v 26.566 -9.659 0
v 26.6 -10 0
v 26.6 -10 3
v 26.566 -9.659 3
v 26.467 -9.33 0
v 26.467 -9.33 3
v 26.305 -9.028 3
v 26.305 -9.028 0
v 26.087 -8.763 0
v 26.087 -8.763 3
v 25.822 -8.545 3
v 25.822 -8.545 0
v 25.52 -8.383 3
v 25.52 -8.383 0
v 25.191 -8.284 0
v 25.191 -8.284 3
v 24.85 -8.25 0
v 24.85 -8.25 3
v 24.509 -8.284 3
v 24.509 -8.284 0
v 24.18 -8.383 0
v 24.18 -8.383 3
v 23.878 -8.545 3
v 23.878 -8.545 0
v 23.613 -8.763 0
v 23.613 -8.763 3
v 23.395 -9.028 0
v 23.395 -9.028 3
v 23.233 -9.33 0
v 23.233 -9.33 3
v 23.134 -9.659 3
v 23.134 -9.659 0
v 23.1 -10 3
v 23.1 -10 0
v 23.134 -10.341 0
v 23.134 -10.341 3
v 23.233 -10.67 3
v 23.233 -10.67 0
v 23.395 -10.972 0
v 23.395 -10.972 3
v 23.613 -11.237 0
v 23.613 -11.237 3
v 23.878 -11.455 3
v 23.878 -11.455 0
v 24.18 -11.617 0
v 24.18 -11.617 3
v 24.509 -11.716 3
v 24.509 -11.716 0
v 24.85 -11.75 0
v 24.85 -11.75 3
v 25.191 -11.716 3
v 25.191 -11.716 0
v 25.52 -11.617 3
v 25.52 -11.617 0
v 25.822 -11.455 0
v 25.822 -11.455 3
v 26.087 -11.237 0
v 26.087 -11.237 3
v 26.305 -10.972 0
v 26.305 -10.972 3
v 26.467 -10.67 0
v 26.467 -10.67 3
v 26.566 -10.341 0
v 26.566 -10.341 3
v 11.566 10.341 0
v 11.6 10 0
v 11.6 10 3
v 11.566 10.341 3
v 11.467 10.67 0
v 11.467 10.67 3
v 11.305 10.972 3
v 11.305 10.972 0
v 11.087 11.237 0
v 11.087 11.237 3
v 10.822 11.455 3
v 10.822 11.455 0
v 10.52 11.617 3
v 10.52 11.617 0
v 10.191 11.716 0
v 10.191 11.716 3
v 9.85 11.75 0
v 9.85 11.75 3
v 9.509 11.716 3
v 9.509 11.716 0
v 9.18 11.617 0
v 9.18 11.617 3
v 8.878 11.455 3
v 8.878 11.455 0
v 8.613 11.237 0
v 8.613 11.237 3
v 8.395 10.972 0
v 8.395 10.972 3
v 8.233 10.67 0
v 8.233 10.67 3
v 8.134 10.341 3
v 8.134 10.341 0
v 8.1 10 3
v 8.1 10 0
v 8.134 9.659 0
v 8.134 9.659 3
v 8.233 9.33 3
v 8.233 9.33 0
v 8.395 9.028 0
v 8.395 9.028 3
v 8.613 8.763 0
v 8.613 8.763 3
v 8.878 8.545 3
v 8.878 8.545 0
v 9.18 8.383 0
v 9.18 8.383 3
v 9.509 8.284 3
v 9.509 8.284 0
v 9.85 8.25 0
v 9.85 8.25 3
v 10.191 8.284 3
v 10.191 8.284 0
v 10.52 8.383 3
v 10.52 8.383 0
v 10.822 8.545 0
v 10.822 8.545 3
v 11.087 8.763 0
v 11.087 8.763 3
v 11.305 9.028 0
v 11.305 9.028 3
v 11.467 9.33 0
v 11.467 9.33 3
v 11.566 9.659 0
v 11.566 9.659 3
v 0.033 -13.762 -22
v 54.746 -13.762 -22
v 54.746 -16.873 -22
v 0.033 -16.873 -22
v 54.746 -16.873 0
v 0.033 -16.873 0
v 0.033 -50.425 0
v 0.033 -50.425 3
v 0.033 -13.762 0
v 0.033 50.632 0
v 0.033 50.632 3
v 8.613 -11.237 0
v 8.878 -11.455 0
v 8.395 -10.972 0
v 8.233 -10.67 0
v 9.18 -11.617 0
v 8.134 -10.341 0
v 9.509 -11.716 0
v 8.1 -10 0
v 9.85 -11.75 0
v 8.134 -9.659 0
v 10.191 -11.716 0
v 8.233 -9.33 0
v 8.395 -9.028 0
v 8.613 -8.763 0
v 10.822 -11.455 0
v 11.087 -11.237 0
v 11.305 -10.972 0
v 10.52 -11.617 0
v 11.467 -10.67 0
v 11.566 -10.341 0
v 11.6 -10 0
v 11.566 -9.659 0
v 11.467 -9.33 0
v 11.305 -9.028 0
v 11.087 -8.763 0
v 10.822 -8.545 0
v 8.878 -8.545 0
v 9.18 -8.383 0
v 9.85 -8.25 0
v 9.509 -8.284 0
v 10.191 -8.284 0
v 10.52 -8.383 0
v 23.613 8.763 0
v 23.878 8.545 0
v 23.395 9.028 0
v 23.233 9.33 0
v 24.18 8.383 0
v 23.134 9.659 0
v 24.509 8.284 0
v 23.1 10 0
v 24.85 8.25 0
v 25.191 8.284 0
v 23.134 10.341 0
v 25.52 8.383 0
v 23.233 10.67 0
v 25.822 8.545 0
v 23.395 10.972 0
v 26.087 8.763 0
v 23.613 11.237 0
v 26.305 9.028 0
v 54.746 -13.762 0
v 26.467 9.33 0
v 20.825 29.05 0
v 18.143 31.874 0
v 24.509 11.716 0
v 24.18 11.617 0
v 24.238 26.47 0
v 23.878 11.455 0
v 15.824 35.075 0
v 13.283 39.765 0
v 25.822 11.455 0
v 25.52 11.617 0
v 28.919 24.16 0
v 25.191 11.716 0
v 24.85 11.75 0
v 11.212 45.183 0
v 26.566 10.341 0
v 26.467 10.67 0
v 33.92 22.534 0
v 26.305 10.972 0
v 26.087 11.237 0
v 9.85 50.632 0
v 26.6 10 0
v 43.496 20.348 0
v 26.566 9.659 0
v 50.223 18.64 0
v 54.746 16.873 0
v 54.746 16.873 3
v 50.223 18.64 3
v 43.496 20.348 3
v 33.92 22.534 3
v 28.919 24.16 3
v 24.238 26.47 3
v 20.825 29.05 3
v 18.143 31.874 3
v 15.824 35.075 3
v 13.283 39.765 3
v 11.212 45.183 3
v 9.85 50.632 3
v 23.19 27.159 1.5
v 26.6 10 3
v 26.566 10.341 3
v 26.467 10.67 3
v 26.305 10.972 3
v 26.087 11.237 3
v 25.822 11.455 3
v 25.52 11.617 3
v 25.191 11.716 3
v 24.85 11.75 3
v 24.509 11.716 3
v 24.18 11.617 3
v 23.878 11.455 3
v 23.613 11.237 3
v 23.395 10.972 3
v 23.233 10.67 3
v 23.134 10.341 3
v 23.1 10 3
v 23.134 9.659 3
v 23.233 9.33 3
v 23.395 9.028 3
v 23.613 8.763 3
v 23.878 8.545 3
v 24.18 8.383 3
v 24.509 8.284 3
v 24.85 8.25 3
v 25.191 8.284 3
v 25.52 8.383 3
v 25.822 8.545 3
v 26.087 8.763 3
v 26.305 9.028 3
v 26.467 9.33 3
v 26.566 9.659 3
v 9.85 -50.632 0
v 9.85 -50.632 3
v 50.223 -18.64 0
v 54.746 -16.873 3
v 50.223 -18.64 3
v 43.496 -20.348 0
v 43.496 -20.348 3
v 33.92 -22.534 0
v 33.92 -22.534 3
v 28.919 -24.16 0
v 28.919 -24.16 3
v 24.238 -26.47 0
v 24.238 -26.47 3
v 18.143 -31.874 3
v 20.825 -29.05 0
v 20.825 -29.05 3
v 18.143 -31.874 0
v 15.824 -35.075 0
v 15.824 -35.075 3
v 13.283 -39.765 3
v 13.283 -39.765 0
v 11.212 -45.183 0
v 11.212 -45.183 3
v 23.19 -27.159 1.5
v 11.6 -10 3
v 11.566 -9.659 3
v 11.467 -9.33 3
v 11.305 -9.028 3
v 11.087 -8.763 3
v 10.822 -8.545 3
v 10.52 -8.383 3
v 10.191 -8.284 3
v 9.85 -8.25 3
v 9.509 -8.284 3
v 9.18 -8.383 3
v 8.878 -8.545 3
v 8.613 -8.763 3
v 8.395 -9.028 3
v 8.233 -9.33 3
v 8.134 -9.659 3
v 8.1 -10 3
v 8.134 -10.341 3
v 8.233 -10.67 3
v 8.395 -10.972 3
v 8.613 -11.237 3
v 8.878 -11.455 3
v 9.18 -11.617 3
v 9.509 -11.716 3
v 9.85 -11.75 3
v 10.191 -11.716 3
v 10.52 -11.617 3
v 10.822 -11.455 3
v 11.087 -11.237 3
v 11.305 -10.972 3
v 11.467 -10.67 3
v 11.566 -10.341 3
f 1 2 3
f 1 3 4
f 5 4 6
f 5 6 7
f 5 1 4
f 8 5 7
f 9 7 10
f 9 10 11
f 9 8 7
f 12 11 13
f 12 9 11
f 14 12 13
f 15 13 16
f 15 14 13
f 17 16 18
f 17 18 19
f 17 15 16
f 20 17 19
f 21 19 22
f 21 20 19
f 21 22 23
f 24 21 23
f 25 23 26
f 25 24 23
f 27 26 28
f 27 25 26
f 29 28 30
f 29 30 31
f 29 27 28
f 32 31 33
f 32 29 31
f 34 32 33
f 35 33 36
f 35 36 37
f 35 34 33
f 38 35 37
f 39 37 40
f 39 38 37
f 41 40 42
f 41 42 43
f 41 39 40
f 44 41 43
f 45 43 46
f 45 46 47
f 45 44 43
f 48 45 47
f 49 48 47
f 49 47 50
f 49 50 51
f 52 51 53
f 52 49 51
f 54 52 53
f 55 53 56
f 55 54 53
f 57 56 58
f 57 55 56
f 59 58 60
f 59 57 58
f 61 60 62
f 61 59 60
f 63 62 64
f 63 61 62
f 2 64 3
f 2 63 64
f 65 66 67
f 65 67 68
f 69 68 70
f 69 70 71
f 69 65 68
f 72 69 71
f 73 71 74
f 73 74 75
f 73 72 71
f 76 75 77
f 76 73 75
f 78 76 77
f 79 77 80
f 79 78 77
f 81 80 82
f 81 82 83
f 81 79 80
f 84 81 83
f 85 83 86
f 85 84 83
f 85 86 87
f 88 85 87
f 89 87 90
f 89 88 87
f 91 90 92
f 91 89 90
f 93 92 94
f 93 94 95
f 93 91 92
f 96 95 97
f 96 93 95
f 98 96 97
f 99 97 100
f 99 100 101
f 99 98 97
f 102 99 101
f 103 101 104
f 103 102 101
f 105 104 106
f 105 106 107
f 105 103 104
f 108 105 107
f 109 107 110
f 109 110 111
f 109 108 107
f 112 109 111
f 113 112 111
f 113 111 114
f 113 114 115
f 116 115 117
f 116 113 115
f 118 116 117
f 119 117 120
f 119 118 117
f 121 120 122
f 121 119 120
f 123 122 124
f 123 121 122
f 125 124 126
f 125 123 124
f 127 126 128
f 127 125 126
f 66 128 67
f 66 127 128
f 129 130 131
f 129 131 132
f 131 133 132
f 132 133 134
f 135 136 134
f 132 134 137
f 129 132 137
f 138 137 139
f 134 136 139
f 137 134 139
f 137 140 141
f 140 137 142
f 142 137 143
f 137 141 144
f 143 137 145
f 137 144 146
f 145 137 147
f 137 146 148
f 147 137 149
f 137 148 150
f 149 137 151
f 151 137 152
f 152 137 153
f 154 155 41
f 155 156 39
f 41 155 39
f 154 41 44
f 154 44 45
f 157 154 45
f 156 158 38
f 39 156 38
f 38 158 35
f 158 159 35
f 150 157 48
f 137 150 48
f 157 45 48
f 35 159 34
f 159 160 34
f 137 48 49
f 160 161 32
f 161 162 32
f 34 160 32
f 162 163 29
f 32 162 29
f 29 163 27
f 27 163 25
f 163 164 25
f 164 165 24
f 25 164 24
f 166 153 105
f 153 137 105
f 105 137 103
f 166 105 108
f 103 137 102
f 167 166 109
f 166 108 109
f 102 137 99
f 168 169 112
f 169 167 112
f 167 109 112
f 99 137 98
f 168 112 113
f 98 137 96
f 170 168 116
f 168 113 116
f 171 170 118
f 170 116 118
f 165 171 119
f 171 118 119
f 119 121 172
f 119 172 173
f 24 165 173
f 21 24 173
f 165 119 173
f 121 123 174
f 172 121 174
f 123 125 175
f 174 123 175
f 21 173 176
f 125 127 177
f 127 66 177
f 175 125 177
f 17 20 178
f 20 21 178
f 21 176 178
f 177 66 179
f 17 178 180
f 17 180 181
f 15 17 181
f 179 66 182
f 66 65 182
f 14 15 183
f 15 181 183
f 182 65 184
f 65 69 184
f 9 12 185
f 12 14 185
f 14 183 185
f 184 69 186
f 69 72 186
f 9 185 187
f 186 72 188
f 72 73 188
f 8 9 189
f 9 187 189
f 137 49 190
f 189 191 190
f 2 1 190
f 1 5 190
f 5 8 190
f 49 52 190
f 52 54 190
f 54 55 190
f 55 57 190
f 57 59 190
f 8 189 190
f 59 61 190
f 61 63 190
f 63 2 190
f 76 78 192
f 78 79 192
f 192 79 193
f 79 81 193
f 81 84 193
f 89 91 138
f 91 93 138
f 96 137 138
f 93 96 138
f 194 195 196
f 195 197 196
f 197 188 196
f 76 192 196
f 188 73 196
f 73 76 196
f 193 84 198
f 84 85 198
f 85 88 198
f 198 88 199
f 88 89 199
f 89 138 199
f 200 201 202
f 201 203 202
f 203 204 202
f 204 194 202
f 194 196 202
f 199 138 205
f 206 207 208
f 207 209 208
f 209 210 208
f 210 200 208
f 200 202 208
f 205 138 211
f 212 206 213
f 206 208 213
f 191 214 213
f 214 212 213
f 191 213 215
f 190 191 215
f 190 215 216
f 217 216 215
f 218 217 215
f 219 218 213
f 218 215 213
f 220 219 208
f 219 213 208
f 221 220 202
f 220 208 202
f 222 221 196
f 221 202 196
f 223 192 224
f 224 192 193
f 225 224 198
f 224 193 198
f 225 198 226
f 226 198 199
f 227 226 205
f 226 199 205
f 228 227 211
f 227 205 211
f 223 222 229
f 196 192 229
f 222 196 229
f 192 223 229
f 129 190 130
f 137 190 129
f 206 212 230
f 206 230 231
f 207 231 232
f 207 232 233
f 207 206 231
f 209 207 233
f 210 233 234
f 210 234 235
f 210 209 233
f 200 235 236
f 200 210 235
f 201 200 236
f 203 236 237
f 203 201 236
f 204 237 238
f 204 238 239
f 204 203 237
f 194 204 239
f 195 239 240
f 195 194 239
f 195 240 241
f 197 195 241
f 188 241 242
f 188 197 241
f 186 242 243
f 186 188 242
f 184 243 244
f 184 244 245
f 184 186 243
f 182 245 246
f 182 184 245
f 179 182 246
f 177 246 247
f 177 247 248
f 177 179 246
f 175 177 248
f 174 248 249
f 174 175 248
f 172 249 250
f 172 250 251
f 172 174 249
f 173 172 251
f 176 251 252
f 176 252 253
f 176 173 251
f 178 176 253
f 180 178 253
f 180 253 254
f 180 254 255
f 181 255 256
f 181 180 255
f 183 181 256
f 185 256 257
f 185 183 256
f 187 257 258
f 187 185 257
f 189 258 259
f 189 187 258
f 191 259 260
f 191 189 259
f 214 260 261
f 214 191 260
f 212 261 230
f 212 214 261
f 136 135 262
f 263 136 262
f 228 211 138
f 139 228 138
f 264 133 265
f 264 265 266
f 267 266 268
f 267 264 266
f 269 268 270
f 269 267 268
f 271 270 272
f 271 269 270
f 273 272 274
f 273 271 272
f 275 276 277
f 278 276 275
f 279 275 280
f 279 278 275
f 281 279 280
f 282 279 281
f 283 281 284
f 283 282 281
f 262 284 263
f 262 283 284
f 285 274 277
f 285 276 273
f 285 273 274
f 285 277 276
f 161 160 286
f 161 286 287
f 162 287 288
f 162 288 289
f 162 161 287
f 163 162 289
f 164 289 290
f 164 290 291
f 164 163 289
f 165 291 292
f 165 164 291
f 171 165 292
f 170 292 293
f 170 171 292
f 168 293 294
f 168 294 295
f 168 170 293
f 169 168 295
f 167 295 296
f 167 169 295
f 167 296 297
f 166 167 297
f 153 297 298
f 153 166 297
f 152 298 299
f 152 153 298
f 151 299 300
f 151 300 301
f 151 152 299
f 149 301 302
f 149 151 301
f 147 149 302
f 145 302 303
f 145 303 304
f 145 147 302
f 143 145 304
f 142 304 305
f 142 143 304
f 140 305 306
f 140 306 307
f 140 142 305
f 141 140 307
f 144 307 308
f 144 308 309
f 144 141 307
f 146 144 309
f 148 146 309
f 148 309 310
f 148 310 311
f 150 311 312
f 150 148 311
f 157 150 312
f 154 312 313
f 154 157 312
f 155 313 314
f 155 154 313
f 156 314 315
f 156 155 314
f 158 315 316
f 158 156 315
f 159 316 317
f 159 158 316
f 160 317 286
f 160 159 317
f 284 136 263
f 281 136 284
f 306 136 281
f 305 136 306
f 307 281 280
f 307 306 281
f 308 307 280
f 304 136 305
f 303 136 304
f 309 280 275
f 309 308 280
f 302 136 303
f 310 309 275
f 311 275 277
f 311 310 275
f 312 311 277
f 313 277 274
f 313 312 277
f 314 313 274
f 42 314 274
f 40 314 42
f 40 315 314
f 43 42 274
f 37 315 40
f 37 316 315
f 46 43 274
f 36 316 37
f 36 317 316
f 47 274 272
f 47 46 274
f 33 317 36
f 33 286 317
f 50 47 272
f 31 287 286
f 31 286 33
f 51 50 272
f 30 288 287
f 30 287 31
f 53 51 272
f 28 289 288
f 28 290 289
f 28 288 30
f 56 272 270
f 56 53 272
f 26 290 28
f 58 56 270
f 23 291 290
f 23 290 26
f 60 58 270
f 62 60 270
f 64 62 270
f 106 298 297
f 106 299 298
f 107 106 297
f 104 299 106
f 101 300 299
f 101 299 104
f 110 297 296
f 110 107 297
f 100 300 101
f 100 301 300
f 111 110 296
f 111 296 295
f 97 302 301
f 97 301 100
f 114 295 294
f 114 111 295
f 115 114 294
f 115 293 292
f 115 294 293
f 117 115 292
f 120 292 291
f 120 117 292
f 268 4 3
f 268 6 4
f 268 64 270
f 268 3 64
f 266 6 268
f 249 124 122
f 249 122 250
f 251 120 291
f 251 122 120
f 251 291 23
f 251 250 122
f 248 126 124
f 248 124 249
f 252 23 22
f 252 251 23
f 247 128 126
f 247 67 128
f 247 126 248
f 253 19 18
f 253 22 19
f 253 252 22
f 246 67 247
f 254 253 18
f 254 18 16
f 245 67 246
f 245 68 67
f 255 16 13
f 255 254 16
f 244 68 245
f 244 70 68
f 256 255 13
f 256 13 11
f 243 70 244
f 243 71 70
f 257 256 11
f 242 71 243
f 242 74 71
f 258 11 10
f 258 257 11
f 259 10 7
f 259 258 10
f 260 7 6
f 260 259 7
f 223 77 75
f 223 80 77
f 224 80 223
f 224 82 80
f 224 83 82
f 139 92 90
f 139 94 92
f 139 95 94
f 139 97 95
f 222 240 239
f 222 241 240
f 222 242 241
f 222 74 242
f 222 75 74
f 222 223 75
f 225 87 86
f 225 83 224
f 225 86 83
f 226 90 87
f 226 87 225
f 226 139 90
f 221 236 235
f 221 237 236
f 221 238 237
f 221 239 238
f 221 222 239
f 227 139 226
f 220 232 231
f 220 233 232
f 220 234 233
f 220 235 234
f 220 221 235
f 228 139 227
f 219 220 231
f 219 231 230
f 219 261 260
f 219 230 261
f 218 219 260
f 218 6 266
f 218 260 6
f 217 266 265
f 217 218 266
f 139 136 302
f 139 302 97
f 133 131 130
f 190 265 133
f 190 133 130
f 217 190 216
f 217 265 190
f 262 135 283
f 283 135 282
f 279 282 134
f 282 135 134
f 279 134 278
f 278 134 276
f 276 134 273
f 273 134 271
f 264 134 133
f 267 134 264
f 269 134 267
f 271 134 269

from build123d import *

# Parameters (mm, degrees)
SKETCH3_R           = 1.75
BOSS_EXTRUDE2_DEPTH = 3
SKETCH4_W           = 54.71275589
SKETCH4_H           = 3.111536519
BOSS_EXTRUDE3_DEPTH = 22


with BuildPart() as part:
    # Sketch3 → Boss-Extrude2 (new body)
    with BuildSketch(Plane.XY):
        with BuildLine():
            Line((0.033369184, 50.631957294), (0.033369184, -50.424600046))
            Line((0.033369184, -50.424600046), (9.85, -50.631957294))
            add(Edge.make_bspline(
                [(54.746125074, -16.873198091), (45.78853614, -21.288615011), (21.037768937, -20.539930575), (11.485294324, -41.9878824), (9.85, -50.631957294)],
                knots=[0, 0, 0, 0, 0.5491041, 1, 1, 1, 1], degree=3))
            Line((54.746125074, -16.873198091), (54.746125074, 16.873198091))
            add(Edge.make_bspline(
                [(54.746125074, 16.873198091), (45.78853614, 21.288615011), (21.037768937, 20.539930575), (11.485294324, 41.9878824), (9.85, 50.631957294)],
                knots=[0, 0, 0, 0, 0.5491041, 1, 1, 1, 1], degree=3))
            Line((9.85, 50.631957294), (0.033369184, 50.631957294))
        make_face()
        with Locations((9.85, 10)):
            Circle(SKETCH3_R, mode=Mode.SUBTRACT)
        with Locations((24.85, 10)):
            Circle(SKETCH3_R, mode=Mode.SUBTRACT)
        with Locations((24.85, -10)):
            Circle(SKETCH3_R, mode=Mode.SUBTRACT)
        with Locations((9.85, -10)):
            Circle(SKETCH3_R, mode=Mode.SUBTRACT)
    extrude(amount=BOSS_EXTRUDE2_DEPTH)

    # Sketch4 → Boss-Extrude3 (add)
    with BuildSketch(Plane(origin=(0, 0, 0), x_dir=(-1, 0, 0), z_dir=(0, 0, -1))):
        with Locations((-27.389747129, -15.317429832)):
            Rectangle(SKETCH4_W, SKETCH4_H)
    extrude(amount=BOSS_EXTRUDE3_DEPTH)


solid = part.part
